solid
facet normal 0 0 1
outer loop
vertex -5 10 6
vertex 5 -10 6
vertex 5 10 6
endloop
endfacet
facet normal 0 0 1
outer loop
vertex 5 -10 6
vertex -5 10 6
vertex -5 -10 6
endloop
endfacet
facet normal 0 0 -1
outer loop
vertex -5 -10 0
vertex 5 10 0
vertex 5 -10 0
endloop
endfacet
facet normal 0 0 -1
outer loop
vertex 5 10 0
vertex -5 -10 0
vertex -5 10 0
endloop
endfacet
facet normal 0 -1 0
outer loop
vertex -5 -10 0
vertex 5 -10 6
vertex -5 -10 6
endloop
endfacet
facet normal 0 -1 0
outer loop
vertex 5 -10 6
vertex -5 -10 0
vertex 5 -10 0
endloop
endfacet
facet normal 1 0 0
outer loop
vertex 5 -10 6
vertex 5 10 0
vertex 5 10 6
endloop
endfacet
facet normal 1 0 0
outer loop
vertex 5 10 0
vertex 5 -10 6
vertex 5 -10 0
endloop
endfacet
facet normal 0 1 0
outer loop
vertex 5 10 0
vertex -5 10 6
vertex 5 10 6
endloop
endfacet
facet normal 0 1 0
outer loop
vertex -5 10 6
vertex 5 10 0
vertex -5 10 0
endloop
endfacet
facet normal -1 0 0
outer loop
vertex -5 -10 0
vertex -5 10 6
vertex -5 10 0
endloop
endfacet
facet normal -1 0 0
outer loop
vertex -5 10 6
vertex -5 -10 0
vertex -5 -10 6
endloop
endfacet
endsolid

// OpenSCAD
// brick 2x4

// external vars #########################

ext_scale = 1.0;

// part ##################################

scale([ext_scale,ext_scale,ext_scale])
translate([-5,-10,0])
cube([10,20,6]);
